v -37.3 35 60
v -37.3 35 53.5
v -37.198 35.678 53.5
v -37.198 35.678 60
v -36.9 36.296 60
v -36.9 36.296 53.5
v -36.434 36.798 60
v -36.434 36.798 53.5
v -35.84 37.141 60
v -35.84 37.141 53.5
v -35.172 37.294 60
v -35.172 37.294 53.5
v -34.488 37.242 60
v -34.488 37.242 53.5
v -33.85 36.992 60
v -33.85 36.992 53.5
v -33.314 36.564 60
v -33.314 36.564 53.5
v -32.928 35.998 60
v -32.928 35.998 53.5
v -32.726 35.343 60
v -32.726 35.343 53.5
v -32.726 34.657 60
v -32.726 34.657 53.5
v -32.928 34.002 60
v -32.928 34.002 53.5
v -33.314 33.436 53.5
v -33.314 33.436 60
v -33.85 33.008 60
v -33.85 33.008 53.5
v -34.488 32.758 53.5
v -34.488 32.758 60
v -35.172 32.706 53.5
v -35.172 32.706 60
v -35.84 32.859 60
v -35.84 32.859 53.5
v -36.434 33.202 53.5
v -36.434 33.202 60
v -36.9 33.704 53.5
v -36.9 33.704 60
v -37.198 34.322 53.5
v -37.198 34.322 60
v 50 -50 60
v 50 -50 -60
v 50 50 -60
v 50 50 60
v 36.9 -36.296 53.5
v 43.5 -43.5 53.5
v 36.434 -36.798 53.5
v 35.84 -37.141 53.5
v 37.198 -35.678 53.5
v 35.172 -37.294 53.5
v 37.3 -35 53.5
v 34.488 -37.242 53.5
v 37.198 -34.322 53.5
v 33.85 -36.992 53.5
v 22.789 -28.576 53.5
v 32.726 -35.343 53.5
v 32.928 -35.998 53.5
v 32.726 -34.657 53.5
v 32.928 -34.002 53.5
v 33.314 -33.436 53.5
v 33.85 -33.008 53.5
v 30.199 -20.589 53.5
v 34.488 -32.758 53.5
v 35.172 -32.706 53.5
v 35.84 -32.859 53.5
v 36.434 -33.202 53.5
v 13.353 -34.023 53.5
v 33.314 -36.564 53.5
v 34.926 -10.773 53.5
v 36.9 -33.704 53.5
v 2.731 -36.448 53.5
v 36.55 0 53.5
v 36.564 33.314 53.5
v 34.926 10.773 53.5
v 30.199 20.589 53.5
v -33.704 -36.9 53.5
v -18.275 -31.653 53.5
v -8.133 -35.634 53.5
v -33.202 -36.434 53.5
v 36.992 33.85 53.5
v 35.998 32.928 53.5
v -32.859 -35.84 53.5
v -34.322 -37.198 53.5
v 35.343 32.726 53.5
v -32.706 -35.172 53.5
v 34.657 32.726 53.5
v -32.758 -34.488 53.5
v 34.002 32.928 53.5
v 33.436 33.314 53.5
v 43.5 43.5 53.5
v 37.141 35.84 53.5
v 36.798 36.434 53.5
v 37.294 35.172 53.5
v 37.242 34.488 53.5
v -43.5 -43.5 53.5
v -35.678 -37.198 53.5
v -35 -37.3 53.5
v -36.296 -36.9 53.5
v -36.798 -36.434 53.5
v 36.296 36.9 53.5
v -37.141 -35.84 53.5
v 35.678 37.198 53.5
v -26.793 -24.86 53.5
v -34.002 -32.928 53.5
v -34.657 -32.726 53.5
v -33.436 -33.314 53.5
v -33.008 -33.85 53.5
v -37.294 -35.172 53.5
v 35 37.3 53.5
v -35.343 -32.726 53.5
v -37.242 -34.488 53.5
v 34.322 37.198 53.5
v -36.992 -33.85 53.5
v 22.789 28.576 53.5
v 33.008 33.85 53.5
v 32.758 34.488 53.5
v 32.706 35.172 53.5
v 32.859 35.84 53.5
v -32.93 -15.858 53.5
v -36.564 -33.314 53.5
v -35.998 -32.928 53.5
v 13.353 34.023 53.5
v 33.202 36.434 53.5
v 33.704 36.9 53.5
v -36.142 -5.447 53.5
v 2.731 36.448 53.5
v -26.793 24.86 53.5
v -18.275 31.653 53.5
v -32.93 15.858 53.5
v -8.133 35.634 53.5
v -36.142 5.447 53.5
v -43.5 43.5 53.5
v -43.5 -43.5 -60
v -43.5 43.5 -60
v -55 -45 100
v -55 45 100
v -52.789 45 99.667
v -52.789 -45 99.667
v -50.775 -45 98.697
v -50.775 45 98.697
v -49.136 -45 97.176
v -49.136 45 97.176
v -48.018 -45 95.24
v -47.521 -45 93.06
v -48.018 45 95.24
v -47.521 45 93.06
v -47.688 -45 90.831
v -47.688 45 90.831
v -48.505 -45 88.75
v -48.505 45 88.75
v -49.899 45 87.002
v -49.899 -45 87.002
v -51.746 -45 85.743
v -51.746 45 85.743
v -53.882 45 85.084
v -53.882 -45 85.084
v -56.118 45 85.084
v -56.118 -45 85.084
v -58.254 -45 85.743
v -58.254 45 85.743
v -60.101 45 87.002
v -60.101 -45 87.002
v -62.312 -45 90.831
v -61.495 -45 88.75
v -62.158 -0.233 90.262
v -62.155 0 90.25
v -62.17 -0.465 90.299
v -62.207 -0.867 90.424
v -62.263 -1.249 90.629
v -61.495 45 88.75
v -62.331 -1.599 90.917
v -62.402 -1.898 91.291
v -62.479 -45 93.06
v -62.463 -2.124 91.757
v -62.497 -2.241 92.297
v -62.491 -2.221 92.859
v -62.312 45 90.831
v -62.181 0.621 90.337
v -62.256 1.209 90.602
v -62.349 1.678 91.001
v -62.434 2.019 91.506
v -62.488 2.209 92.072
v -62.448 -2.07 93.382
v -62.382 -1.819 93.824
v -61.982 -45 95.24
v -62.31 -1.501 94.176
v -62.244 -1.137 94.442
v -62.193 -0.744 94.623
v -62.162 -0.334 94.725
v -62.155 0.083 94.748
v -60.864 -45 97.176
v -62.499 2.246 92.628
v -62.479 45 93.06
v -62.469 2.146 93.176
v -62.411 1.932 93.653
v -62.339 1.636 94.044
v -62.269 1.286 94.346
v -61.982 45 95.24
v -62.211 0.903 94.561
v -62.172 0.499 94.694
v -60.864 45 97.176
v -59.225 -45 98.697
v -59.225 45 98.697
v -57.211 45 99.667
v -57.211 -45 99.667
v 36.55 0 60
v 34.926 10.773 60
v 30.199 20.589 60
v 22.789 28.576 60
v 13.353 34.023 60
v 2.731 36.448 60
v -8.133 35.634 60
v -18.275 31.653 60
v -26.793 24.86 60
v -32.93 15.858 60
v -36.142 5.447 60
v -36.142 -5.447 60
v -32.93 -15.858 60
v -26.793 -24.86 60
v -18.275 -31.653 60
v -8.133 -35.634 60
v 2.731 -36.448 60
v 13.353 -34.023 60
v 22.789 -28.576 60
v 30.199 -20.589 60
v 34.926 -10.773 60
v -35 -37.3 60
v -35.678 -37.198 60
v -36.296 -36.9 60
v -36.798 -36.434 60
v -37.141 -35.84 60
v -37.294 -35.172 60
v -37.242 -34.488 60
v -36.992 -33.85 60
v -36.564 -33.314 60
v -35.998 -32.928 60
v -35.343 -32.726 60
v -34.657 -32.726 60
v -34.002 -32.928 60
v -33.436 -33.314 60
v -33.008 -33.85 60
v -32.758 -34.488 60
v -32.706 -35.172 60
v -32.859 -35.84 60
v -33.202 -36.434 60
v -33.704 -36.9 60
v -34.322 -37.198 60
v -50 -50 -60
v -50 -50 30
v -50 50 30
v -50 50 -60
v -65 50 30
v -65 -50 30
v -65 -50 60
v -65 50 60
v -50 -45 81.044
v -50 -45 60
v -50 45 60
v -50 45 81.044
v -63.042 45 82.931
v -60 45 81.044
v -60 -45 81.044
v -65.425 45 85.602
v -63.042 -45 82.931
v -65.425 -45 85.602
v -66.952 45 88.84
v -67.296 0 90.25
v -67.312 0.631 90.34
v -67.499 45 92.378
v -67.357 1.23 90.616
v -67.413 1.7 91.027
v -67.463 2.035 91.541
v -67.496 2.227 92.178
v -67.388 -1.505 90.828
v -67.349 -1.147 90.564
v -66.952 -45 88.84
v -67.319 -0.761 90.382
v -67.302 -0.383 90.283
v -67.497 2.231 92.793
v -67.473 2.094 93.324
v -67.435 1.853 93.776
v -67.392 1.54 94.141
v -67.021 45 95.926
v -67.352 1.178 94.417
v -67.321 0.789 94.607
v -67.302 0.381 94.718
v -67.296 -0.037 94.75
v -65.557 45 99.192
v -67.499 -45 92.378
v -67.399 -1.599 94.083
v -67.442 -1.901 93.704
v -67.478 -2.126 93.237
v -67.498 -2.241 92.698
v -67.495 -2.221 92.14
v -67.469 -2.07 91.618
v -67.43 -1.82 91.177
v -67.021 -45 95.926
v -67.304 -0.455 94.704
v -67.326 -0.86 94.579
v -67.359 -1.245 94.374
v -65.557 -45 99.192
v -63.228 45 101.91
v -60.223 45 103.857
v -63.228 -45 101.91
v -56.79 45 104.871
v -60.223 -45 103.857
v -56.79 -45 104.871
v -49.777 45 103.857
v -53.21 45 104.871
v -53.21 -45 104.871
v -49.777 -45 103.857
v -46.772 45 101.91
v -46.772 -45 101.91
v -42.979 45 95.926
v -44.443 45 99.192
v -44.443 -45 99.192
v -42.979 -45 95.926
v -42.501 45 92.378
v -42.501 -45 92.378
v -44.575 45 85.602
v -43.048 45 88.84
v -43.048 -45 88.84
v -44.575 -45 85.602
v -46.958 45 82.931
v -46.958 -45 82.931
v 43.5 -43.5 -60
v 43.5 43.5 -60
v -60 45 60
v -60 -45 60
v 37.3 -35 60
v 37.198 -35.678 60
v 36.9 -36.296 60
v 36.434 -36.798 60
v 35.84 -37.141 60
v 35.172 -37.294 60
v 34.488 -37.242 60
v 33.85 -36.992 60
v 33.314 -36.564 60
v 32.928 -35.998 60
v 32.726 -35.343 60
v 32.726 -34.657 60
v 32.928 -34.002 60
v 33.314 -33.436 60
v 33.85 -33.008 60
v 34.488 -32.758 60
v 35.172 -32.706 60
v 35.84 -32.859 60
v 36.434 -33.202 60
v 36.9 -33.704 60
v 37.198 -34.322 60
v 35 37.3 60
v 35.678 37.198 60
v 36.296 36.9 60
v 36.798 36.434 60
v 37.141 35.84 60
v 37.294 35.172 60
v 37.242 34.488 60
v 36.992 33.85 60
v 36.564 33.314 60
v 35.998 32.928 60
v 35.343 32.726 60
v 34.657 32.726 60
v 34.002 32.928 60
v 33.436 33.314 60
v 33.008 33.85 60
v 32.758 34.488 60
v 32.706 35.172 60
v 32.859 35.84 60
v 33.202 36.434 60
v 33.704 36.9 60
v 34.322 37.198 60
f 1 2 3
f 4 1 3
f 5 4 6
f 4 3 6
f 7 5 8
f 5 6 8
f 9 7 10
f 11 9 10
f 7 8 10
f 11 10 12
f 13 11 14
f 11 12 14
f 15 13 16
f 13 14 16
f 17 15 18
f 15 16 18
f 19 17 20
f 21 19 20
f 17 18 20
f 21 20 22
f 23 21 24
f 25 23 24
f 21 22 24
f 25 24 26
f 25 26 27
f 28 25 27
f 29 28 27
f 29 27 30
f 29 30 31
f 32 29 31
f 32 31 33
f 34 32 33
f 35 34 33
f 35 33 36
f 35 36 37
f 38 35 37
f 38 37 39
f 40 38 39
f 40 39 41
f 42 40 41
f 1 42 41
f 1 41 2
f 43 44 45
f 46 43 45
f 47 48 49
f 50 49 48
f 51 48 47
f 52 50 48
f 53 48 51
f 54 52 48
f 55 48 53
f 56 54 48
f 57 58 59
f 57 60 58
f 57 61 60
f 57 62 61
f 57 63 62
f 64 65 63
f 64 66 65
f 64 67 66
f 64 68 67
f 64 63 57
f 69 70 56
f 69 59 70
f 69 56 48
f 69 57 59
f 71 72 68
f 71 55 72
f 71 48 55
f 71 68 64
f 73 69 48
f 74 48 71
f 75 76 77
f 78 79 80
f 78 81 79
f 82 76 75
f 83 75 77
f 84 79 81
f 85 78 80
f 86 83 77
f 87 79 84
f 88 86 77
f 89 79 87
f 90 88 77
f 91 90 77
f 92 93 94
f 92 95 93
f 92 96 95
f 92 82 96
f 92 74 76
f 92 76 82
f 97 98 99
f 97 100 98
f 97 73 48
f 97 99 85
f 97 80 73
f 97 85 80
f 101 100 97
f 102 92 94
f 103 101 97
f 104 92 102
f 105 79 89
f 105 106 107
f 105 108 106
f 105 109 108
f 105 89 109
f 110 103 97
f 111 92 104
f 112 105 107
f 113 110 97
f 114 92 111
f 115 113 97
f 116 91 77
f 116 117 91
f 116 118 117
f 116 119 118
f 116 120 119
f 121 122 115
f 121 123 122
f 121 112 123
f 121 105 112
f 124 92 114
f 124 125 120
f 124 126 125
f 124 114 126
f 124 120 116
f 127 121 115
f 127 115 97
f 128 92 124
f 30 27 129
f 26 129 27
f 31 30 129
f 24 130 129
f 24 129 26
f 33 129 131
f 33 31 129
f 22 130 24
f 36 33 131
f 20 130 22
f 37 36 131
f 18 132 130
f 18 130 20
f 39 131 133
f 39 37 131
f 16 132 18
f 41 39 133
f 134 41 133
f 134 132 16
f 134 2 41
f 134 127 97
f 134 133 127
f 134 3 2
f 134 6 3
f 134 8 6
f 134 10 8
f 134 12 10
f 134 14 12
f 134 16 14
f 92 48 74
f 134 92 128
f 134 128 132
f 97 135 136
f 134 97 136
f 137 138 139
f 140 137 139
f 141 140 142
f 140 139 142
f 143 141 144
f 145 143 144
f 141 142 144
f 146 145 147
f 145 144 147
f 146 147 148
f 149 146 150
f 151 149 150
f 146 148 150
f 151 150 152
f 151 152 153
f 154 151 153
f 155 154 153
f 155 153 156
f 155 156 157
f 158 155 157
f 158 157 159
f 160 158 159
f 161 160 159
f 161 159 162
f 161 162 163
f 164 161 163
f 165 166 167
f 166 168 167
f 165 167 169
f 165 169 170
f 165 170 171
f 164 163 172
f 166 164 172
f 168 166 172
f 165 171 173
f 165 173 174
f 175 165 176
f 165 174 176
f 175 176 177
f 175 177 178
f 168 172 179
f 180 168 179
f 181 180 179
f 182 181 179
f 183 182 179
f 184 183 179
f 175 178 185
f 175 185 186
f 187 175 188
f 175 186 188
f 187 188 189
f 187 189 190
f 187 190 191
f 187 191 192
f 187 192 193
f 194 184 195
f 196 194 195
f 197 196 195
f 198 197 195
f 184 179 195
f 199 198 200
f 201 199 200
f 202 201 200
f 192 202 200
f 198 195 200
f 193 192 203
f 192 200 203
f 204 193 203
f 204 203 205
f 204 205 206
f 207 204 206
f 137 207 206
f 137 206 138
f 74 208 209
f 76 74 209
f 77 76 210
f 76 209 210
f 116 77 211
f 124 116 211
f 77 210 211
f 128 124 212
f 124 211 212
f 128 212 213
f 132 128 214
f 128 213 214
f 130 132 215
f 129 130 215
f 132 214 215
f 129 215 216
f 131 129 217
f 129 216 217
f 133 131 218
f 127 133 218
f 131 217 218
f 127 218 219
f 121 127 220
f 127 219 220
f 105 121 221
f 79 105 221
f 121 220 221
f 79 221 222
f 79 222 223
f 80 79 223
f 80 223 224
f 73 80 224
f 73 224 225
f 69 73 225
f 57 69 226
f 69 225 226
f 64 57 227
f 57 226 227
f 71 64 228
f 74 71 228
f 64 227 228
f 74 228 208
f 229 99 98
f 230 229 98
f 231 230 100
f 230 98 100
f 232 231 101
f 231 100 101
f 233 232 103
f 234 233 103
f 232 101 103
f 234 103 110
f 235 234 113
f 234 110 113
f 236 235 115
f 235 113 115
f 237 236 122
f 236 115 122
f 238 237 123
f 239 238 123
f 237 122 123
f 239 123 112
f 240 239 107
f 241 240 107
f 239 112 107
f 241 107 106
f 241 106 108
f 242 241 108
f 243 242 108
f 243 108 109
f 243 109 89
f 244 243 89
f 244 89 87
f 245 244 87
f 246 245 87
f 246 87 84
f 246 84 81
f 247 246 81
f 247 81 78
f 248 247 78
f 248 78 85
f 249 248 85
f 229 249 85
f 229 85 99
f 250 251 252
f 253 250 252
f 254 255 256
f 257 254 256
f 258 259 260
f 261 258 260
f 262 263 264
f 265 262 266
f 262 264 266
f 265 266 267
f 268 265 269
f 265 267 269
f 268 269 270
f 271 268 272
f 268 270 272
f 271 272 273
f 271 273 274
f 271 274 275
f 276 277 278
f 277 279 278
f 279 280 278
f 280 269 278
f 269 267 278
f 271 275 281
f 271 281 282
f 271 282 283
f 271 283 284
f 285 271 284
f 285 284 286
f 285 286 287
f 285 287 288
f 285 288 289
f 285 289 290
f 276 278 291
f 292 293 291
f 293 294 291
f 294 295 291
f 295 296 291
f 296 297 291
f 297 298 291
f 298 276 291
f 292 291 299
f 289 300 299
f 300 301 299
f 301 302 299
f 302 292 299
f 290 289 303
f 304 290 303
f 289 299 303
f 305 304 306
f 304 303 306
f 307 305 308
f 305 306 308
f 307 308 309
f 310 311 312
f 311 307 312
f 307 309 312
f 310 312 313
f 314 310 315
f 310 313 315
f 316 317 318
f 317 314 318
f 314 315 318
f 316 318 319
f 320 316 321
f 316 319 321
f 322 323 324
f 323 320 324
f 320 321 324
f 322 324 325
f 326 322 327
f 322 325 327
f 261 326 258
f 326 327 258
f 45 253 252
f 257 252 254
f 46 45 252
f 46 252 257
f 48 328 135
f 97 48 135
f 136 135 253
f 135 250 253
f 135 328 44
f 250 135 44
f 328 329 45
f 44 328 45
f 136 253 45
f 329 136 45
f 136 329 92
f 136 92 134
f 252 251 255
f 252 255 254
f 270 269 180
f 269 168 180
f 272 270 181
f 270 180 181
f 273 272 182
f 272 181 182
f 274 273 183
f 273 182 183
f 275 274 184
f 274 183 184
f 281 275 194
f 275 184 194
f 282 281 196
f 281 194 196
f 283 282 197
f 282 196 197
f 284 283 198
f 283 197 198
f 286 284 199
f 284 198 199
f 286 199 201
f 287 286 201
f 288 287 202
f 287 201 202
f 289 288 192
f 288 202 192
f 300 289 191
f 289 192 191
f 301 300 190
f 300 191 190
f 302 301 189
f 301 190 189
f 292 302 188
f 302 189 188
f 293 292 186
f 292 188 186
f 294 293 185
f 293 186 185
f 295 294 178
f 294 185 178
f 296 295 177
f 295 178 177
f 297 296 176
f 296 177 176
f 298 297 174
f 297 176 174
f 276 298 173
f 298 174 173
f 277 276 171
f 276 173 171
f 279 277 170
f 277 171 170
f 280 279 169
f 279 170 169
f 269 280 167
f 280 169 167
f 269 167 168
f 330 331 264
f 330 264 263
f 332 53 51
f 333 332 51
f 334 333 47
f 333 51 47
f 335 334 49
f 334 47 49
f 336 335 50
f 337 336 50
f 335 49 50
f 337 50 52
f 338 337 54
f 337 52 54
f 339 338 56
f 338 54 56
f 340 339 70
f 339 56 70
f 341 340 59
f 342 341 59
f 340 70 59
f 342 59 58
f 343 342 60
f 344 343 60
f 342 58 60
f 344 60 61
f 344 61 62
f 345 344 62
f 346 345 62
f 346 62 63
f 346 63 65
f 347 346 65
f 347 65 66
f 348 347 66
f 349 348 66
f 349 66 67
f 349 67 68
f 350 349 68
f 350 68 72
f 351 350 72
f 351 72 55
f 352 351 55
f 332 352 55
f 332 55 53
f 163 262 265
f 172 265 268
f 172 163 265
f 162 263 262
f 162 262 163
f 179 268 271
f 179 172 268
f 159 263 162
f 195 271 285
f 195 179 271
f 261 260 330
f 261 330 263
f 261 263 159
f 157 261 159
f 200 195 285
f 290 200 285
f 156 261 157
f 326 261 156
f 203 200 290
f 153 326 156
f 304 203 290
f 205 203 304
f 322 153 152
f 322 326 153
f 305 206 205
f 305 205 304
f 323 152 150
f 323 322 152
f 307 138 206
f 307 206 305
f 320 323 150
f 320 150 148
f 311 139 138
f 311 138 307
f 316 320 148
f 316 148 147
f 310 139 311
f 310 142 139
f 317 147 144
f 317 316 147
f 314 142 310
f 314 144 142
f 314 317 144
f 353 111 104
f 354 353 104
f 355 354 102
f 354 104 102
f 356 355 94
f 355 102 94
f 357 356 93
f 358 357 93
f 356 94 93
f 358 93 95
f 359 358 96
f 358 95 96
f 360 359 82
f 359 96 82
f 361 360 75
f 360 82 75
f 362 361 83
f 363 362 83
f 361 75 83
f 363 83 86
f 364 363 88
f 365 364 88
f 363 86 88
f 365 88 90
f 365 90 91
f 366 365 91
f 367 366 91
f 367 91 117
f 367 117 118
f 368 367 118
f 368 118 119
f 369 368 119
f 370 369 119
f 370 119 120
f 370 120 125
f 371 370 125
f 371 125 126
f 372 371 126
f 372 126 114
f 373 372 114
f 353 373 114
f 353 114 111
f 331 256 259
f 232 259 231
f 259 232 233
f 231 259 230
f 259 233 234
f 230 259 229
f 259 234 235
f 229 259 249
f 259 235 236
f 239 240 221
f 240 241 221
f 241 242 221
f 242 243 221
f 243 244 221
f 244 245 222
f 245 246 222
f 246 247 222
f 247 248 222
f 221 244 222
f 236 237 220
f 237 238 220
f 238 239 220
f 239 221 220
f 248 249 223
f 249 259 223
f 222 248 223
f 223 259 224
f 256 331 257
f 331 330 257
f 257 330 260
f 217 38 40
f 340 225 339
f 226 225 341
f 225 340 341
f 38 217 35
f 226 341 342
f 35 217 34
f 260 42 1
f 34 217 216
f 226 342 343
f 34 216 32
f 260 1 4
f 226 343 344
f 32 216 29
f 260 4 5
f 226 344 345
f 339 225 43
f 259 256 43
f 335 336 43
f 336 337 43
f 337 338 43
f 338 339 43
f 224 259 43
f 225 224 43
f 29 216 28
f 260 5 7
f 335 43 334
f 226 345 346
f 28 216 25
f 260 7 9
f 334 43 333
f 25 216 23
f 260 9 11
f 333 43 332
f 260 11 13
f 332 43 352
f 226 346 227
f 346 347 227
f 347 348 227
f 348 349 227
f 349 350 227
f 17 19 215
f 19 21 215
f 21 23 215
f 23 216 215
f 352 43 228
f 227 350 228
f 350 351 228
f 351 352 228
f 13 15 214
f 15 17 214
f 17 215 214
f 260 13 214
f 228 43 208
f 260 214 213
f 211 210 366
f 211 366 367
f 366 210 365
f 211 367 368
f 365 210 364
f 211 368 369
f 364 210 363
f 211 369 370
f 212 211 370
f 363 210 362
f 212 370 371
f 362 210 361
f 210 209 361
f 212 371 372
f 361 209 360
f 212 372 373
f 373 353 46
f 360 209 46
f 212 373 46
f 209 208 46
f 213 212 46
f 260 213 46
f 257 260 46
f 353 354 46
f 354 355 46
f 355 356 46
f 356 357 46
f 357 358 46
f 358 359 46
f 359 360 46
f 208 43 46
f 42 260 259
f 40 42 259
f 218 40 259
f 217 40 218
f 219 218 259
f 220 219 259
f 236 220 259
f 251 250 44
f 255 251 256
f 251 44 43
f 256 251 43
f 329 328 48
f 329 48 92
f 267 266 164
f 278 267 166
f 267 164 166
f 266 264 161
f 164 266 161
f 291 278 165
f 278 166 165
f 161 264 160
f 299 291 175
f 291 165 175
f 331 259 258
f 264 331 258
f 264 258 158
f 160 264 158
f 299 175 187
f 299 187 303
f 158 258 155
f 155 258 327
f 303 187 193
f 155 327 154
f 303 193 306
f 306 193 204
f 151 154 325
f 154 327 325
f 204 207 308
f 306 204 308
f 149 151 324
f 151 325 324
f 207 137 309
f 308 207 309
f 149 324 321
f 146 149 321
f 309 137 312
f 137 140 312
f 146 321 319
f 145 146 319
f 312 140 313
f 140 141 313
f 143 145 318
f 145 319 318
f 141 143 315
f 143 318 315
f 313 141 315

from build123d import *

# Parameters (mm, degrees)
SKETCH1_W                           = 100
SKETCH1_H                           = 100
BOSS_EXTRUDE1_DEPTH                 = 60
SKETCH2_W                           = 87
SKETCH2_H                           = 87
CUT_EXTRUDE1_DEPTH                  = 113.5
SKETCH4_R                           = 36.55
CUT_EXTRUDE2_DEPTH                  = 6.5
F_4_6_4_6_DIAMETER_HOLE1_D          = 4.6
CIRPATTERN1_COUNT                   = 4
SKETCH13_W                          = 30
SKETCH13_H                          = 100
BOSS_EXTRUDE6_DEPTH                 = 15
BOSS_EXTRUDE7_DEPTH                 = 45
BOSS_EXTRUDE7_DEPTH_BACK            = 45
SKETCH15_R                          = 12.5
BOSS_EXTRUDE8_REACH                 = 148.48
BOSS_EXTRUDE8_END_RADIUS            = 12.5
SKETCH14_W                          = 10
SKETCH14_H                          = 90
SKETCH16_R                          = 7.5
CUT_EXTRUDE4_DEPTH                  = 90
CUT_EXTRUDE5_REACH                  = 165.554
CUT_EXTRUDE5_END_RADIUS             = 12.5
SKETCH17_R                          = 2.25
CUT_EXTRUDE5_DIRECTION_2_REACH      = 165.554
CUT_EXTRUDE5_DIRECTION_2_END_RADIUS = 7.5


with BuildPart() as part:
    # Sketch1 → Boss-Extrude1 (new, symmetric)
    with BuildSketch(Plane.XY):
        Rectangle(SKETCH1_W, SKETCH1_H)
    extrude(amount=BOSS_EXTRUDE1_DEPTH, both=True)

    # Sketch2 → Cut-Extrude1 (cut)
    with BuildSketch(Plane(origin=(0, 0, -60), x_dir=(-1, 0, 0), z_dir=(0, 0, -1))):
        Rectangle(SKETCH2_W, SKETCH2_H)
    extrude(amount=-CUT_EXTRUDE1_DEPTH, mode=Mode.SUBTRACT)

    # Sketch4 → Cut-Extrude2 (cut)
    with BuildSketch(Plane.XY.offset(60)):
        Circle(SKETCH4_R)
    extrude(amount=-CUT_EXTRUDE2_DEPTH, mode=Mode.SUBTRACT)

    # Ø4.6 (4.6) Diameter Hole1 (through all)
    with Locations(Plane.XY.offset(60)):
        with Locations((-35, 35)):
            f_4_6_4_6_diameter_hole1 = Hole(F_4_6_4_6_DIAMETER_HOLE1_D / 2)

    # CirPattern1: Ø4.6 (4.6) Diameter Hole1 ×4 about axis
    cirpattern1_axis = Axis((0, 0, 0), (0, 0, 1))
    for i in range(1, CIRPATTERN1_COUNT):
        add(f_4_6_4_6_diameter_hole1.rotate(cirpattern1_axis, i * 360 / CIRPATTERN1_COUNT), mode=Mode.SUBTRACT)

    # Sketch13 → Boss-Extrude6 (add)
    with BuildSketch(Plane.ZY.offset(50)):
        with Locations((45, 0)):
            Rectangle(SKETCH13_W, SKETCH13_H)
    extrude(amount=BOSS_EXTRUDE6_DEPTH)



with BuildPart() as body_2:
    # Sketch15 → Boss-Extrude7 (new, two sides: drawn at the far end of the back side and taken through both)
    with BuildSketch(Plane(origin=(0, 0, 0), x_dir=(1, 0, 0), z_dir=(0, 1, 0)).offset(-BOSS_EXTRUDE7_DEPTH_BACK)):
        with Locations(Location((-55, -92.5, 0), (0, 0, 270))):
            Circle(SKETCH15_R)
    extrude(amount=BOSS_EXTRUDE7_DEPTH + BOSS_EXTRUDE7_DEPTH_BACK)


with BuildPart() as part_1:
    add(part.part)

    add(body_2.part)  # Boss-Extrude8 merges body 2
    # Boss-Extrude8: up to this cylinder (the profile starts outside it)
    boss_extrude8_end = Plane(origin=(-55, 0, 92.5), z_dir=(0, -1, 0)) * Cylinder(BOSS_EXTRUDE8_END_RADIUS, 322.96, mode=Mode.PRIVATE)
    # Sketch14 → Boss-Extrude8 (add, up to the surface)
    with BuildSketch(Plane.XY.offset(60), mode=Mode.PRIVATE) as boss_extrude8_sk1:
        with Locations((-55, 0)):
            Rectangle(SKETCH14_W, SKETCH14_H)
    boss_extrude8_tool1 = extrude(boss_extrude8_sk1.sketch, amount=BOSS_EXTRUDE8_REACH, mode=Mode.PRIVATE) - boss_extrude8_end
    add(boss_extrude8_tool1.solids().sort_by_distance((-55, 0, 60))[0])

    # Sketch16 → Cut-Extrude4 (cut)
    with BuildSketch(Plane(origin=(0, 45, 0), x_dir=(1, 0, 0), z_dir=(0, 1, 0))):
        with Locations(Location((-55, -92.5, 0), (0, 0, 270))):
            Circle(SKETCH16_R)
    extrude(amount=-CUT_EXTRUDE4_DEPTH, mode=Mode.SUBTRACT)

    # Cut-Extrude5: up to this cylinder (the profile starts inside it)
    cut_extrude5_end = Plane(origin=(-55, 0, 92.5), z_dir=(0, -1, 0)) * Cylinder(CUT_EXTRUDE5_END_RADIUS, 357.108, mode=Mode.PRIVATE)
    # Sketch17 → Cut-Extrude5 (cut, up to the surface)
    with BuildSketch(Plane(origin=(-65, 0, 0), x_dir=(0, 0, -1), z_dir=(1, 0, 0)), mode=Mode.PRIVATE) as cut_extrude5_sk1:
        with Locations((-92.5, 0)):
            Circle(SKETCH17_R)
    cut_extrude5_tool1 = extrude(cut_extrude5_sk1.sketch, amount=-CUT_EXTRUDE5_REACH, mode=Mode.PRIVATE) & cut_extrude5_end
    add(cut_extrude5_tool1.solids().sort_by_distance((-65, 0, 92.5))[0], mode=Mode.SUBTRACT)

    # Cut-Extrude5 direction 2: up to this cylinder (the profile starts outside it)
    cut_extrude5_direction_2_end = Plane(origin=(-55, 0, 92.5), z_dir=(0, 1, 0)) * Cylinder(CUT_EXTRUDE5_DIRECTION_2_END_RADIUS, 347.108, mode=Mode.PRIVATE)
    # Sketch17 → Cut-Extrude5 direction 2 (cut, up to the surface)
    with BuildSketch(Plane(origin=(-65, 0, 0), x_dir=(0, 0, -1), z_dir=(1, 0, 0)), mode=Mode.PRIVATE) as cut_extrude5_direction_2_sk1:
        with Locations((-92.5, 0)):
            Circle(SKETCH17_R)
    cut_extrude5_direction_2_tool1 = extrude(cut_extrude5_direction_2_sk1.sketch, amount=CUT_EXTRUDE5_DIRECTION_2_REACH, mode=Mode.PRIVATE) - cut_extrude5_direction_2_end
    add(cut_extrude5_direction_2_tool1.solids().sort_by_distance((-65, 0, 92.5))[0], mode=Mode.SUBTRACT)


solid = part_1.part
